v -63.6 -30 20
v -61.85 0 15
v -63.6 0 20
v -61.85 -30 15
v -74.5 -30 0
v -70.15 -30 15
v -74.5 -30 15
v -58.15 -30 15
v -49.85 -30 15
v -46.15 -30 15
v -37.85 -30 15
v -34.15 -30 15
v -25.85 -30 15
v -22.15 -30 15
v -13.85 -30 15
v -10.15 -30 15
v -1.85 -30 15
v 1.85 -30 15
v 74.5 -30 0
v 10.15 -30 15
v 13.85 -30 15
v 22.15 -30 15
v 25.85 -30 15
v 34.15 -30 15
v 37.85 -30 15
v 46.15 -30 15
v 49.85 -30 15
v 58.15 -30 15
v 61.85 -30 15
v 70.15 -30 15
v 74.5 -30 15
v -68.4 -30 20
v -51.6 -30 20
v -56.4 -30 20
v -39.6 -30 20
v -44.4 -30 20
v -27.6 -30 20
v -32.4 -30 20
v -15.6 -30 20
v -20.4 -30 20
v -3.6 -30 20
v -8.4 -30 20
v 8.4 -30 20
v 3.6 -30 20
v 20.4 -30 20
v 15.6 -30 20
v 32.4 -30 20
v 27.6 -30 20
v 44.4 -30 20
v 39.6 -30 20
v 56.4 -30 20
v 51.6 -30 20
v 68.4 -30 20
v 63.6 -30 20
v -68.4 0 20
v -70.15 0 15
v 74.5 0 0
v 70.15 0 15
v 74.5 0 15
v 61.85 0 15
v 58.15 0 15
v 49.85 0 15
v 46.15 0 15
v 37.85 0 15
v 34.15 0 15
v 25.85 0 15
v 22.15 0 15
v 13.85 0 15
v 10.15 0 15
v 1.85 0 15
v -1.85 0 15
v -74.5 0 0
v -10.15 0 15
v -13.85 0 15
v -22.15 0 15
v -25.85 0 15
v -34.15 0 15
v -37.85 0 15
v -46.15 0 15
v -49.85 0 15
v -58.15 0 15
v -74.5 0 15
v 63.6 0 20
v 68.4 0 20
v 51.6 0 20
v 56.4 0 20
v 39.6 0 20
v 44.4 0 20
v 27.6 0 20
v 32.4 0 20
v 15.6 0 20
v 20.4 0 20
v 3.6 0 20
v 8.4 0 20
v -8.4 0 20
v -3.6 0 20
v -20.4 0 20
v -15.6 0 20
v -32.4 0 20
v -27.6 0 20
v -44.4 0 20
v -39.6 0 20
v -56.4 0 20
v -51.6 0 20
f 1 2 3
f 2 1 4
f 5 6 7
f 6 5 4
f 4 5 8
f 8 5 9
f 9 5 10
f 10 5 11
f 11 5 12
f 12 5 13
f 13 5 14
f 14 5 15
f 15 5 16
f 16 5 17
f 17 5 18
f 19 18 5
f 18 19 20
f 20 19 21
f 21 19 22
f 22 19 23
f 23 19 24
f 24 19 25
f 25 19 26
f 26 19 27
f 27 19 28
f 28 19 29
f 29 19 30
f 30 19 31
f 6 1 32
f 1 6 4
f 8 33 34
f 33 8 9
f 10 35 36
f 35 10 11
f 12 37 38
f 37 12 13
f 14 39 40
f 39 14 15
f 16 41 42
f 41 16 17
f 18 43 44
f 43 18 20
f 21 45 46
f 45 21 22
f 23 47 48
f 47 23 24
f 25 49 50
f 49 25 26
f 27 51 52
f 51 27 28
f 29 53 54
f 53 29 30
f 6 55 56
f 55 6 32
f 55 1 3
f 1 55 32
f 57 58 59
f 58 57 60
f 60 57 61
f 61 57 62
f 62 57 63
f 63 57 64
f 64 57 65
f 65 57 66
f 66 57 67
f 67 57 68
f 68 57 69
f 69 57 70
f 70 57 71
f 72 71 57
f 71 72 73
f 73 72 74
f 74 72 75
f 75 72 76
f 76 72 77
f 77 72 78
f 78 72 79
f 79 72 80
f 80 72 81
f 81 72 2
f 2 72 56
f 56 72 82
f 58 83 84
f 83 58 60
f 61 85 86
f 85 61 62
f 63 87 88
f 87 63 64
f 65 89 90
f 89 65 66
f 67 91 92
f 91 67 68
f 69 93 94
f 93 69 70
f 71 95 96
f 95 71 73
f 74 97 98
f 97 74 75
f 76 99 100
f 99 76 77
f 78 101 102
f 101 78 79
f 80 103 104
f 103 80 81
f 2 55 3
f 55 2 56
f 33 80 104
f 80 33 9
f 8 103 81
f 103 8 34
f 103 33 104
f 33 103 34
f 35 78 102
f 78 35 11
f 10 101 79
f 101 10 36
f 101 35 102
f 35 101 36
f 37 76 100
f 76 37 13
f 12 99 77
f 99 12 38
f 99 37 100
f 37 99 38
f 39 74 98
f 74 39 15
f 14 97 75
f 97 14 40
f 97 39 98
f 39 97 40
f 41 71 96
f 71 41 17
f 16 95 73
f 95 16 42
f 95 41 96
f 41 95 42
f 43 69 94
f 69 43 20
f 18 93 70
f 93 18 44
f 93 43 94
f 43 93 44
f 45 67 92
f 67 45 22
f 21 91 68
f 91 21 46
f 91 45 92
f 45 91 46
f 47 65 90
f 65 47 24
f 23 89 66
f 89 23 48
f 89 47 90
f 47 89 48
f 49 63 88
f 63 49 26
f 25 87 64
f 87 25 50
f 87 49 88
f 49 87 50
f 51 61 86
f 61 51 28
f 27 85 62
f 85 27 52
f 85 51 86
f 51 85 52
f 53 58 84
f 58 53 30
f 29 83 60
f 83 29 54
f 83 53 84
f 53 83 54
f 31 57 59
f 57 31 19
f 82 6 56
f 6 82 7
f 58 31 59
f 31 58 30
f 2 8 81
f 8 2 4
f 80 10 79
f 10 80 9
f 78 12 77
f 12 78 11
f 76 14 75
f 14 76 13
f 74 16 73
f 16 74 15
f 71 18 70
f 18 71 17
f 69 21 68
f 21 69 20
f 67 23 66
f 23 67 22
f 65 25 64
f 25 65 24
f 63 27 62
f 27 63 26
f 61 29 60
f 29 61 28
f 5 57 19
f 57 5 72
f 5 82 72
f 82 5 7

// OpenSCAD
$fn = 32;

// ----------------------------------------------------------------------
// Toothed rack, 12 teeth
// 12 mm pitch, 5 mm teeth
// ----------------------------------------------------------------------

// --- parameters (mm) ---
bar_w = 30;     // bar width (Y)
bar_h = 15;     // bar height (Z)
teeth = 12;     // number of teeth
pitch = 12;     // tooth pitch
tooth_h = 5;    // tooth height above the bar
root_w = 9;     // tooth width at the root
crest_w = 4.8;  // tooth width at the crest

// --- derived feature positions (mm) ---
span = (teeth - 1) * pitch;  // = 132   distance between the outer teeth
bar_l = span + root_w + 8;   // = 149   bar length: teeth plus 4 mm at each end
tooth_x = -span / 2;         // = -66   X of the first tooth
height = bar_h + tooth_h;    // = 20   overall height
feature_centers = [
  [tooth_x + 0 * pitch, -bar_w / 2],
  [tooth_x + 1 * pitch, -bar_w / 2],
  [tooth_x + 2 * pitch, -bar_w / 2],
  [tooth_x + 3 * pitch, -bar_w / 2],
  [tooth_x + 4 * pitch, -bar_w / 2],
  [tooth_x + 5 * pitch, -bar_w / 2],
  [tooth_x + 6 * pitch, -bar_w / 2],
  [tooth_x + 7 * pitch, -bar_w / 2],
  [tooth_x + 8 * pitch, -bar_w / 2],
  [tooth_x + 9 * pitch, -bar_w / 2],
  [tooth_x + 10 * pitch, -bar_w / 2],
  [tooth_x + 11 * pitch, -bar_w / 2]
];   // tooth centre line, drives the tooth loop

// bar with a rack of teeth, one extruded trapezoium per centre
module rack_tooth() {
  linear_extrude(height = bar_w)
    polygon(points = [
      [0, 0],
      [root_w, 0],
      [root_w / 2 + crest_w / 2, tooth_h + 1],
      [root_w / 2 - crest_w / 2, tooth_h + 1]
    ]);
}

union() {
  translate([-bar_l / 2, -bar_w, 0]) cube([bar_l, bar_w, bar_h]);
  for (centre = feature_centers)
    translate([centre[0] - root_w / 2, 0, bar_h - 1]) rotate([90, 0, 0]) rack_tooth();
}
